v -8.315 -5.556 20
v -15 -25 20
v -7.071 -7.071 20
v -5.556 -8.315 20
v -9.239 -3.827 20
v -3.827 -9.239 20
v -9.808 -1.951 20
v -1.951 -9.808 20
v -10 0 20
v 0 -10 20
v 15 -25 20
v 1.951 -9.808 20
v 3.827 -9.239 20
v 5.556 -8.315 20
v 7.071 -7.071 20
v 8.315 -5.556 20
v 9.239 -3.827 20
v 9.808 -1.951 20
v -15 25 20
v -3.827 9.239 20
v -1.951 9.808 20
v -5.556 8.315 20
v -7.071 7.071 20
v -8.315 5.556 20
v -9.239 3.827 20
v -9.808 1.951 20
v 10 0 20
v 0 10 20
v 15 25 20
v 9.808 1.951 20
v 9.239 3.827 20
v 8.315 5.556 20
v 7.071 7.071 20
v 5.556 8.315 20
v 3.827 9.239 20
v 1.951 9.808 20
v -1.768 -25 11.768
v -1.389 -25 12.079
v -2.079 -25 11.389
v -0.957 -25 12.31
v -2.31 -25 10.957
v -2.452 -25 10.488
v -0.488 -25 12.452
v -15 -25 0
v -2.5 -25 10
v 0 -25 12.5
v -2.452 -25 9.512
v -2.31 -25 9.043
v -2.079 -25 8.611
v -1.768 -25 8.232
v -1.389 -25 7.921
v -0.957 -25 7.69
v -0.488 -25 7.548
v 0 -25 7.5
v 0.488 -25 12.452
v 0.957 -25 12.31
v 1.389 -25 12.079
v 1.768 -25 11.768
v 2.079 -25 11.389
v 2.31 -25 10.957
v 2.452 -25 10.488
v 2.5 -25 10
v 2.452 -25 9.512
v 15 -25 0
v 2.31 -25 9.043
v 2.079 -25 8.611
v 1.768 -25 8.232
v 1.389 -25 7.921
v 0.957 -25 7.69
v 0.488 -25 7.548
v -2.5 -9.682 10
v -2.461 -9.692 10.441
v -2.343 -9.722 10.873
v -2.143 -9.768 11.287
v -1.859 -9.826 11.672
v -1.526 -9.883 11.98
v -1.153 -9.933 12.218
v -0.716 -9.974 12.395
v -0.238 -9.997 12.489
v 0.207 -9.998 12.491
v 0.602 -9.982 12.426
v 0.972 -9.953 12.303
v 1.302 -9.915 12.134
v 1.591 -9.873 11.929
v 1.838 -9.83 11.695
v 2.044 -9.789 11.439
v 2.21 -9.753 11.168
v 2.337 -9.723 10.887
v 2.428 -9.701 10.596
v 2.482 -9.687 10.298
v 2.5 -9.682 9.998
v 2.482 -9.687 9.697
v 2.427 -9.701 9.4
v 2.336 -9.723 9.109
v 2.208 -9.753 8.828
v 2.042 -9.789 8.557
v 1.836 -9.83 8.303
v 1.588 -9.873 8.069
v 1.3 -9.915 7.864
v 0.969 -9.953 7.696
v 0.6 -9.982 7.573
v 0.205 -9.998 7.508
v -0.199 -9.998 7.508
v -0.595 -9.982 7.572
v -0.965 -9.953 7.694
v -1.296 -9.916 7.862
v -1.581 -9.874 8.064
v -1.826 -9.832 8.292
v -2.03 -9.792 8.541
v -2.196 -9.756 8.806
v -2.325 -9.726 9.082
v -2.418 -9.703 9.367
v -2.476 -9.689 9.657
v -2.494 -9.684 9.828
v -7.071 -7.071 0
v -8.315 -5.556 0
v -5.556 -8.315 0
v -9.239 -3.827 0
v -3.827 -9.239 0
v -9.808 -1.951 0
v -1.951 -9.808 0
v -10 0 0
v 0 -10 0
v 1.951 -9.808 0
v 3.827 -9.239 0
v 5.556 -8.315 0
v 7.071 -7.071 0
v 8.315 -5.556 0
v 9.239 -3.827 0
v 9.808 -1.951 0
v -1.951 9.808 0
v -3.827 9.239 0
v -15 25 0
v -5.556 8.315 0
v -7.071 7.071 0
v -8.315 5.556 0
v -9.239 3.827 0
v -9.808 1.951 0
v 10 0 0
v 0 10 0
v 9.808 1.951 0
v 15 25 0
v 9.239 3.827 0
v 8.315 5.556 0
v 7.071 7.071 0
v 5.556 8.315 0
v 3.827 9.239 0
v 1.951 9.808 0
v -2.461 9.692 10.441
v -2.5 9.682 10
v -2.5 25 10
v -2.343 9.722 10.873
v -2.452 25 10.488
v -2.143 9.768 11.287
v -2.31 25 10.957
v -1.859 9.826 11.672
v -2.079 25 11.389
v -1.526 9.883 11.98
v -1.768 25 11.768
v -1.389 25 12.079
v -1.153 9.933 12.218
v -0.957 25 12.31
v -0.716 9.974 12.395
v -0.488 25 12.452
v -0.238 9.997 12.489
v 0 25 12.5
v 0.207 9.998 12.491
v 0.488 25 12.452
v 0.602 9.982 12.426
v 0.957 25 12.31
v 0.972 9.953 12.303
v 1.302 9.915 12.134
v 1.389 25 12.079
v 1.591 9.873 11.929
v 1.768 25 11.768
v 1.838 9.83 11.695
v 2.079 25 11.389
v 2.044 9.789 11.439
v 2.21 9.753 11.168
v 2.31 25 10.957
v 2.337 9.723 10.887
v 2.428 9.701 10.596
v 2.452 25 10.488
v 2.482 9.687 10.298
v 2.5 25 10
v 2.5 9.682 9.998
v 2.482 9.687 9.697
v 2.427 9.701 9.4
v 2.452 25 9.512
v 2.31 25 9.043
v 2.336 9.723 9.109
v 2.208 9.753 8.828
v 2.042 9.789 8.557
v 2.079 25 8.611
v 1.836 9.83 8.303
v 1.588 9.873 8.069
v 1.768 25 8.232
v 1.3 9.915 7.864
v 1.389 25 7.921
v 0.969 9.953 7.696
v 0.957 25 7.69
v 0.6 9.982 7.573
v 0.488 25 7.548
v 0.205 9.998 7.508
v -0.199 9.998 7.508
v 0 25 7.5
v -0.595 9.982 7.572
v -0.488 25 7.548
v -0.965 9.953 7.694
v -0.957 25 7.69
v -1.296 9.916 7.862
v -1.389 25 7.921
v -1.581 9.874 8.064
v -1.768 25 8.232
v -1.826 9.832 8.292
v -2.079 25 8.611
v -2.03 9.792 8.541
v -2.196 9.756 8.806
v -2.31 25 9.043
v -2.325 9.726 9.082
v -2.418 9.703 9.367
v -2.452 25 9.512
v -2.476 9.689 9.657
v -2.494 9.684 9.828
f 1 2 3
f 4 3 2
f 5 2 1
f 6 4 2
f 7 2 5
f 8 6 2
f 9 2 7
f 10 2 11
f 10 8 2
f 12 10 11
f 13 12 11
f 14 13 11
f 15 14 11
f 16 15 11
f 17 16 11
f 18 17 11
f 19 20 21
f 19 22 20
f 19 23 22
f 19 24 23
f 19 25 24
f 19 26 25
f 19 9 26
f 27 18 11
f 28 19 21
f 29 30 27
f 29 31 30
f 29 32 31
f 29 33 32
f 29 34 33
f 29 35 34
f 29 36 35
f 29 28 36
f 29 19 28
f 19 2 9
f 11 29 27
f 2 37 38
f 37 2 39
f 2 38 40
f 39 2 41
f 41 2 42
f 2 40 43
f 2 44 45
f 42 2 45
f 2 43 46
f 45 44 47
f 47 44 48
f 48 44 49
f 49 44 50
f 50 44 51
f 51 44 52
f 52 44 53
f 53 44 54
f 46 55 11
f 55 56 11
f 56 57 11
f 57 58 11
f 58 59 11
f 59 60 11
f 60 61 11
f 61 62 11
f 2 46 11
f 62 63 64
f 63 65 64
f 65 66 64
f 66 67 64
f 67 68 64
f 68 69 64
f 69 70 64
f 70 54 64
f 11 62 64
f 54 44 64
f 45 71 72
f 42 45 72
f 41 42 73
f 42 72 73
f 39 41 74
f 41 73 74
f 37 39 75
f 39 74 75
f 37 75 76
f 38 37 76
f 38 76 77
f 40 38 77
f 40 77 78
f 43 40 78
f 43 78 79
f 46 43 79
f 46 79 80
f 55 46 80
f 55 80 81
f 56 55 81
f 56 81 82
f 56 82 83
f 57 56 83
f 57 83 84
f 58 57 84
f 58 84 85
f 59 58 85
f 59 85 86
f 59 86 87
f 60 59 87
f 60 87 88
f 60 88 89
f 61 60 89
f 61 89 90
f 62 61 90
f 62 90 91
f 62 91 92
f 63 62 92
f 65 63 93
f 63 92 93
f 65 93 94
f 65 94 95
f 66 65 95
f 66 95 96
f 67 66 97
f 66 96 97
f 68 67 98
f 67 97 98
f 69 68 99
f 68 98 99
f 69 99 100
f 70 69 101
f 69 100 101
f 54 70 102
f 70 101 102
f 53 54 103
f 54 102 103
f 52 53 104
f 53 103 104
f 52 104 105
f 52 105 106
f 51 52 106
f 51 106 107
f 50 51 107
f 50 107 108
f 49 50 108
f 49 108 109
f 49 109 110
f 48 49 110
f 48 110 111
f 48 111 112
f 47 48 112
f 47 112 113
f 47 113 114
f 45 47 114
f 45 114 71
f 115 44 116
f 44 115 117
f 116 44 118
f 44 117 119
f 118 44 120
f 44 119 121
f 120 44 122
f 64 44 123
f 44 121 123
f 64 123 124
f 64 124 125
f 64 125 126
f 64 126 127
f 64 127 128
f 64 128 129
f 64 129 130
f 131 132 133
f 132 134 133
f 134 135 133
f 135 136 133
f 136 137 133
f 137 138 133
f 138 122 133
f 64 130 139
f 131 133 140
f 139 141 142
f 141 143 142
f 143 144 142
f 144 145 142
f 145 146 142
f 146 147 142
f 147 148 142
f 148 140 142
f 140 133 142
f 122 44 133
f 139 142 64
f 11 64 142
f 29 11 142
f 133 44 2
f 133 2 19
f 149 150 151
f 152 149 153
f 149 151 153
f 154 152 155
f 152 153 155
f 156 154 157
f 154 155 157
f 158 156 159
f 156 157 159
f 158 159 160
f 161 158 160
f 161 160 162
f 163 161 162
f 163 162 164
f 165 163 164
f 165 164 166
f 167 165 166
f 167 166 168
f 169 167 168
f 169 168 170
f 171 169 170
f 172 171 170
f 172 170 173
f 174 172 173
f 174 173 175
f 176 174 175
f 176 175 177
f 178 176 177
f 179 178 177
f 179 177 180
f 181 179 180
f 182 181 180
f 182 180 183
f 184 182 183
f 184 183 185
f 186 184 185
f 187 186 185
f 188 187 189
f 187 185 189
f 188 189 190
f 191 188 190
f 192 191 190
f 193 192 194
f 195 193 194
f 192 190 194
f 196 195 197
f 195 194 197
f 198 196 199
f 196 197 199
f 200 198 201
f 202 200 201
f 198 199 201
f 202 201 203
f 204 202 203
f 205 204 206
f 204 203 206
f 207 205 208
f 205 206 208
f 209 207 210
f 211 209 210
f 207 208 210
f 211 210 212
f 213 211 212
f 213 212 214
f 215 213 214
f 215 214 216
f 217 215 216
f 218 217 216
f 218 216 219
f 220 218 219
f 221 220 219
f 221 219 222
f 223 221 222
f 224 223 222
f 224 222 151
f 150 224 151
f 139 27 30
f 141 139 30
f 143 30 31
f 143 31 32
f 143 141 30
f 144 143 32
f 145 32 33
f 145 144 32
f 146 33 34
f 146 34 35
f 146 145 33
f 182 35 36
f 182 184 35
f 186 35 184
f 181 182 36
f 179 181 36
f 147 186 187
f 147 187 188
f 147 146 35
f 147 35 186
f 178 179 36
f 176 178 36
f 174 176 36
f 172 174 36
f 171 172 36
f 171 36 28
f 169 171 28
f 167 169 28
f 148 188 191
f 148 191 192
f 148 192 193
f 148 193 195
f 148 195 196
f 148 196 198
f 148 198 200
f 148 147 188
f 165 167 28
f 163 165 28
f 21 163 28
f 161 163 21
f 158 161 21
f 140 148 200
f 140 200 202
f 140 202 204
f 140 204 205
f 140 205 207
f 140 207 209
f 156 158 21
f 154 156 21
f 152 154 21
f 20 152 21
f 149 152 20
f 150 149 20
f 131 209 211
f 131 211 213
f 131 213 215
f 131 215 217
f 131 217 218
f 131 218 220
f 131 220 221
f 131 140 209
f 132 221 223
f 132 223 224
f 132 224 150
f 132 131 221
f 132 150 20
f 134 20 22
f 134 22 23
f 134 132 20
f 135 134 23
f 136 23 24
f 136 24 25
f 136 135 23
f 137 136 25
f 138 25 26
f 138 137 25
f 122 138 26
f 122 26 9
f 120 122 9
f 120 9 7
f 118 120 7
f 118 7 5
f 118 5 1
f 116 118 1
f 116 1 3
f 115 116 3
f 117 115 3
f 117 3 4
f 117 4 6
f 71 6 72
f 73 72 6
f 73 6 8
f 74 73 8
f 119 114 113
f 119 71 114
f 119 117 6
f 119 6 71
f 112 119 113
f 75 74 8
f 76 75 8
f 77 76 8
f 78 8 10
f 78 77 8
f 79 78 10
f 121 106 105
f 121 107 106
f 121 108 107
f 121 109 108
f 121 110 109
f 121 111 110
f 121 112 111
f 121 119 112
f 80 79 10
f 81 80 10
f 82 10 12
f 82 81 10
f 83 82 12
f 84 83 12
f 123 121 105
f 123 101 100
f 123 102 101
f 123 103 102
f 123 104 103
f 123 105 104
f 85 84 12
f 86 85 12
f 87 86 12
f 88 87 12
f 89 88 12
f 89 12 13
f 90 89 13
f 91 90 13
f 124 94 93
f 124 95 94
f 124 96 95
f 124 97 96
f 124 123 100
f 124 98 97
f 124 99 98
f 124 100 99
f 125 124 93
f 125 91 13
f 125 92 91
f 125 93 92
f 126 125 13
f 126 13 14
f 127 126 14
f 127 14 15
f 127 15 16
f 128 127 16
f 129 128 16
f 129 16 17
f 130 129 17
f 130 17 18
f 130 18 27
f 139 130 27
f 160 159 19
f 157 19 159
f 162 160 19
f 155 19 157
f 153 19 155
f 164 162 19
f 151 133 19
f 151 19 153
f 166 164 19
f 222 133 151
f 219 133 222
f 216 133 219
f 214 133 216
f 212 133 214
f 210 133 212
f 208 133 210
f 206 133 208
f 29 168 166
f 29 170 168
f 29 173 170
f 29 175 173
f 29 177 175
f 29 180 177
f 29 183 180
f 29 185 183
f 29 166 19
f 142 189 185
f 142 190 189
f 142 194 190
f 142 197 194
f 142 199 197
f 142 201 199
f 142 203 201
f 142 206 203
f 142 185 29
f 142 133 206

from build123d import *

# Parameters (mm, degrees)
IZIM1_W                     = 30
IZIM1_H                     = 50
IZIM1_R                     = 10
Y_KSEKLIK_EKSTR_ZYON1_DEPTH = 20
KES_EKSTR_ZYON1_REACH       = 57.902
IZIM2_R                     = 2.5


with BuildPart() as part:
    # Çizim1 → Yükseklik-Ekstrüzyon1 (new body)
    with BuildSketch(Plane.XY):
        Rectangle(IZIM1_W, IZIM1_H)
        Circle(IZIM1_R, mode=Mode.SUBTRACT)
    extrude(amount=Y_KSEKLIK_EKSTR_ZYON1_DEPTH)

    # Kes-Ekstrüzyon1: up to this face of the body (flat: up to its plane)
    kes_ekstr_zyon1_end = Plane(part.part.faces().sort_by_distance((0, -25, 10))[0])
    # Çizim2 → Kes-Ekstrüzyon1 (cut, up to the picked face)
    with BuildSketch(Plane(origin=(0, 25, 0), x_dir=(1, 0, 0), z_dir=(0, 1, 0)), mode=Mode.PRIVATE) as kes_ekstr_zyon1_sk1:
        with Locations(Location((0, -10, 0), (0, 0, 180))):
            Circle(IZIM2_R)
    kes_ekstr_zyon1_tool1 = split(extrude(kes_ekstr_zyon1_sk1.sketch, amount=-KES_EKSTR_ZYON1_REACH, mode=Mode.PRIVATE), bisect_by=kes_ekstr_zyon1_end, keep=Keep.BOTH, mode=Mode.PRIVATE)
    add(kes_ekstr_zyon1_tool1.solids().sort_by(Axis((0, 25, 10), (0, -1, 0)))[0], mode=Mode.SUBTRACT)


solid = part.part
